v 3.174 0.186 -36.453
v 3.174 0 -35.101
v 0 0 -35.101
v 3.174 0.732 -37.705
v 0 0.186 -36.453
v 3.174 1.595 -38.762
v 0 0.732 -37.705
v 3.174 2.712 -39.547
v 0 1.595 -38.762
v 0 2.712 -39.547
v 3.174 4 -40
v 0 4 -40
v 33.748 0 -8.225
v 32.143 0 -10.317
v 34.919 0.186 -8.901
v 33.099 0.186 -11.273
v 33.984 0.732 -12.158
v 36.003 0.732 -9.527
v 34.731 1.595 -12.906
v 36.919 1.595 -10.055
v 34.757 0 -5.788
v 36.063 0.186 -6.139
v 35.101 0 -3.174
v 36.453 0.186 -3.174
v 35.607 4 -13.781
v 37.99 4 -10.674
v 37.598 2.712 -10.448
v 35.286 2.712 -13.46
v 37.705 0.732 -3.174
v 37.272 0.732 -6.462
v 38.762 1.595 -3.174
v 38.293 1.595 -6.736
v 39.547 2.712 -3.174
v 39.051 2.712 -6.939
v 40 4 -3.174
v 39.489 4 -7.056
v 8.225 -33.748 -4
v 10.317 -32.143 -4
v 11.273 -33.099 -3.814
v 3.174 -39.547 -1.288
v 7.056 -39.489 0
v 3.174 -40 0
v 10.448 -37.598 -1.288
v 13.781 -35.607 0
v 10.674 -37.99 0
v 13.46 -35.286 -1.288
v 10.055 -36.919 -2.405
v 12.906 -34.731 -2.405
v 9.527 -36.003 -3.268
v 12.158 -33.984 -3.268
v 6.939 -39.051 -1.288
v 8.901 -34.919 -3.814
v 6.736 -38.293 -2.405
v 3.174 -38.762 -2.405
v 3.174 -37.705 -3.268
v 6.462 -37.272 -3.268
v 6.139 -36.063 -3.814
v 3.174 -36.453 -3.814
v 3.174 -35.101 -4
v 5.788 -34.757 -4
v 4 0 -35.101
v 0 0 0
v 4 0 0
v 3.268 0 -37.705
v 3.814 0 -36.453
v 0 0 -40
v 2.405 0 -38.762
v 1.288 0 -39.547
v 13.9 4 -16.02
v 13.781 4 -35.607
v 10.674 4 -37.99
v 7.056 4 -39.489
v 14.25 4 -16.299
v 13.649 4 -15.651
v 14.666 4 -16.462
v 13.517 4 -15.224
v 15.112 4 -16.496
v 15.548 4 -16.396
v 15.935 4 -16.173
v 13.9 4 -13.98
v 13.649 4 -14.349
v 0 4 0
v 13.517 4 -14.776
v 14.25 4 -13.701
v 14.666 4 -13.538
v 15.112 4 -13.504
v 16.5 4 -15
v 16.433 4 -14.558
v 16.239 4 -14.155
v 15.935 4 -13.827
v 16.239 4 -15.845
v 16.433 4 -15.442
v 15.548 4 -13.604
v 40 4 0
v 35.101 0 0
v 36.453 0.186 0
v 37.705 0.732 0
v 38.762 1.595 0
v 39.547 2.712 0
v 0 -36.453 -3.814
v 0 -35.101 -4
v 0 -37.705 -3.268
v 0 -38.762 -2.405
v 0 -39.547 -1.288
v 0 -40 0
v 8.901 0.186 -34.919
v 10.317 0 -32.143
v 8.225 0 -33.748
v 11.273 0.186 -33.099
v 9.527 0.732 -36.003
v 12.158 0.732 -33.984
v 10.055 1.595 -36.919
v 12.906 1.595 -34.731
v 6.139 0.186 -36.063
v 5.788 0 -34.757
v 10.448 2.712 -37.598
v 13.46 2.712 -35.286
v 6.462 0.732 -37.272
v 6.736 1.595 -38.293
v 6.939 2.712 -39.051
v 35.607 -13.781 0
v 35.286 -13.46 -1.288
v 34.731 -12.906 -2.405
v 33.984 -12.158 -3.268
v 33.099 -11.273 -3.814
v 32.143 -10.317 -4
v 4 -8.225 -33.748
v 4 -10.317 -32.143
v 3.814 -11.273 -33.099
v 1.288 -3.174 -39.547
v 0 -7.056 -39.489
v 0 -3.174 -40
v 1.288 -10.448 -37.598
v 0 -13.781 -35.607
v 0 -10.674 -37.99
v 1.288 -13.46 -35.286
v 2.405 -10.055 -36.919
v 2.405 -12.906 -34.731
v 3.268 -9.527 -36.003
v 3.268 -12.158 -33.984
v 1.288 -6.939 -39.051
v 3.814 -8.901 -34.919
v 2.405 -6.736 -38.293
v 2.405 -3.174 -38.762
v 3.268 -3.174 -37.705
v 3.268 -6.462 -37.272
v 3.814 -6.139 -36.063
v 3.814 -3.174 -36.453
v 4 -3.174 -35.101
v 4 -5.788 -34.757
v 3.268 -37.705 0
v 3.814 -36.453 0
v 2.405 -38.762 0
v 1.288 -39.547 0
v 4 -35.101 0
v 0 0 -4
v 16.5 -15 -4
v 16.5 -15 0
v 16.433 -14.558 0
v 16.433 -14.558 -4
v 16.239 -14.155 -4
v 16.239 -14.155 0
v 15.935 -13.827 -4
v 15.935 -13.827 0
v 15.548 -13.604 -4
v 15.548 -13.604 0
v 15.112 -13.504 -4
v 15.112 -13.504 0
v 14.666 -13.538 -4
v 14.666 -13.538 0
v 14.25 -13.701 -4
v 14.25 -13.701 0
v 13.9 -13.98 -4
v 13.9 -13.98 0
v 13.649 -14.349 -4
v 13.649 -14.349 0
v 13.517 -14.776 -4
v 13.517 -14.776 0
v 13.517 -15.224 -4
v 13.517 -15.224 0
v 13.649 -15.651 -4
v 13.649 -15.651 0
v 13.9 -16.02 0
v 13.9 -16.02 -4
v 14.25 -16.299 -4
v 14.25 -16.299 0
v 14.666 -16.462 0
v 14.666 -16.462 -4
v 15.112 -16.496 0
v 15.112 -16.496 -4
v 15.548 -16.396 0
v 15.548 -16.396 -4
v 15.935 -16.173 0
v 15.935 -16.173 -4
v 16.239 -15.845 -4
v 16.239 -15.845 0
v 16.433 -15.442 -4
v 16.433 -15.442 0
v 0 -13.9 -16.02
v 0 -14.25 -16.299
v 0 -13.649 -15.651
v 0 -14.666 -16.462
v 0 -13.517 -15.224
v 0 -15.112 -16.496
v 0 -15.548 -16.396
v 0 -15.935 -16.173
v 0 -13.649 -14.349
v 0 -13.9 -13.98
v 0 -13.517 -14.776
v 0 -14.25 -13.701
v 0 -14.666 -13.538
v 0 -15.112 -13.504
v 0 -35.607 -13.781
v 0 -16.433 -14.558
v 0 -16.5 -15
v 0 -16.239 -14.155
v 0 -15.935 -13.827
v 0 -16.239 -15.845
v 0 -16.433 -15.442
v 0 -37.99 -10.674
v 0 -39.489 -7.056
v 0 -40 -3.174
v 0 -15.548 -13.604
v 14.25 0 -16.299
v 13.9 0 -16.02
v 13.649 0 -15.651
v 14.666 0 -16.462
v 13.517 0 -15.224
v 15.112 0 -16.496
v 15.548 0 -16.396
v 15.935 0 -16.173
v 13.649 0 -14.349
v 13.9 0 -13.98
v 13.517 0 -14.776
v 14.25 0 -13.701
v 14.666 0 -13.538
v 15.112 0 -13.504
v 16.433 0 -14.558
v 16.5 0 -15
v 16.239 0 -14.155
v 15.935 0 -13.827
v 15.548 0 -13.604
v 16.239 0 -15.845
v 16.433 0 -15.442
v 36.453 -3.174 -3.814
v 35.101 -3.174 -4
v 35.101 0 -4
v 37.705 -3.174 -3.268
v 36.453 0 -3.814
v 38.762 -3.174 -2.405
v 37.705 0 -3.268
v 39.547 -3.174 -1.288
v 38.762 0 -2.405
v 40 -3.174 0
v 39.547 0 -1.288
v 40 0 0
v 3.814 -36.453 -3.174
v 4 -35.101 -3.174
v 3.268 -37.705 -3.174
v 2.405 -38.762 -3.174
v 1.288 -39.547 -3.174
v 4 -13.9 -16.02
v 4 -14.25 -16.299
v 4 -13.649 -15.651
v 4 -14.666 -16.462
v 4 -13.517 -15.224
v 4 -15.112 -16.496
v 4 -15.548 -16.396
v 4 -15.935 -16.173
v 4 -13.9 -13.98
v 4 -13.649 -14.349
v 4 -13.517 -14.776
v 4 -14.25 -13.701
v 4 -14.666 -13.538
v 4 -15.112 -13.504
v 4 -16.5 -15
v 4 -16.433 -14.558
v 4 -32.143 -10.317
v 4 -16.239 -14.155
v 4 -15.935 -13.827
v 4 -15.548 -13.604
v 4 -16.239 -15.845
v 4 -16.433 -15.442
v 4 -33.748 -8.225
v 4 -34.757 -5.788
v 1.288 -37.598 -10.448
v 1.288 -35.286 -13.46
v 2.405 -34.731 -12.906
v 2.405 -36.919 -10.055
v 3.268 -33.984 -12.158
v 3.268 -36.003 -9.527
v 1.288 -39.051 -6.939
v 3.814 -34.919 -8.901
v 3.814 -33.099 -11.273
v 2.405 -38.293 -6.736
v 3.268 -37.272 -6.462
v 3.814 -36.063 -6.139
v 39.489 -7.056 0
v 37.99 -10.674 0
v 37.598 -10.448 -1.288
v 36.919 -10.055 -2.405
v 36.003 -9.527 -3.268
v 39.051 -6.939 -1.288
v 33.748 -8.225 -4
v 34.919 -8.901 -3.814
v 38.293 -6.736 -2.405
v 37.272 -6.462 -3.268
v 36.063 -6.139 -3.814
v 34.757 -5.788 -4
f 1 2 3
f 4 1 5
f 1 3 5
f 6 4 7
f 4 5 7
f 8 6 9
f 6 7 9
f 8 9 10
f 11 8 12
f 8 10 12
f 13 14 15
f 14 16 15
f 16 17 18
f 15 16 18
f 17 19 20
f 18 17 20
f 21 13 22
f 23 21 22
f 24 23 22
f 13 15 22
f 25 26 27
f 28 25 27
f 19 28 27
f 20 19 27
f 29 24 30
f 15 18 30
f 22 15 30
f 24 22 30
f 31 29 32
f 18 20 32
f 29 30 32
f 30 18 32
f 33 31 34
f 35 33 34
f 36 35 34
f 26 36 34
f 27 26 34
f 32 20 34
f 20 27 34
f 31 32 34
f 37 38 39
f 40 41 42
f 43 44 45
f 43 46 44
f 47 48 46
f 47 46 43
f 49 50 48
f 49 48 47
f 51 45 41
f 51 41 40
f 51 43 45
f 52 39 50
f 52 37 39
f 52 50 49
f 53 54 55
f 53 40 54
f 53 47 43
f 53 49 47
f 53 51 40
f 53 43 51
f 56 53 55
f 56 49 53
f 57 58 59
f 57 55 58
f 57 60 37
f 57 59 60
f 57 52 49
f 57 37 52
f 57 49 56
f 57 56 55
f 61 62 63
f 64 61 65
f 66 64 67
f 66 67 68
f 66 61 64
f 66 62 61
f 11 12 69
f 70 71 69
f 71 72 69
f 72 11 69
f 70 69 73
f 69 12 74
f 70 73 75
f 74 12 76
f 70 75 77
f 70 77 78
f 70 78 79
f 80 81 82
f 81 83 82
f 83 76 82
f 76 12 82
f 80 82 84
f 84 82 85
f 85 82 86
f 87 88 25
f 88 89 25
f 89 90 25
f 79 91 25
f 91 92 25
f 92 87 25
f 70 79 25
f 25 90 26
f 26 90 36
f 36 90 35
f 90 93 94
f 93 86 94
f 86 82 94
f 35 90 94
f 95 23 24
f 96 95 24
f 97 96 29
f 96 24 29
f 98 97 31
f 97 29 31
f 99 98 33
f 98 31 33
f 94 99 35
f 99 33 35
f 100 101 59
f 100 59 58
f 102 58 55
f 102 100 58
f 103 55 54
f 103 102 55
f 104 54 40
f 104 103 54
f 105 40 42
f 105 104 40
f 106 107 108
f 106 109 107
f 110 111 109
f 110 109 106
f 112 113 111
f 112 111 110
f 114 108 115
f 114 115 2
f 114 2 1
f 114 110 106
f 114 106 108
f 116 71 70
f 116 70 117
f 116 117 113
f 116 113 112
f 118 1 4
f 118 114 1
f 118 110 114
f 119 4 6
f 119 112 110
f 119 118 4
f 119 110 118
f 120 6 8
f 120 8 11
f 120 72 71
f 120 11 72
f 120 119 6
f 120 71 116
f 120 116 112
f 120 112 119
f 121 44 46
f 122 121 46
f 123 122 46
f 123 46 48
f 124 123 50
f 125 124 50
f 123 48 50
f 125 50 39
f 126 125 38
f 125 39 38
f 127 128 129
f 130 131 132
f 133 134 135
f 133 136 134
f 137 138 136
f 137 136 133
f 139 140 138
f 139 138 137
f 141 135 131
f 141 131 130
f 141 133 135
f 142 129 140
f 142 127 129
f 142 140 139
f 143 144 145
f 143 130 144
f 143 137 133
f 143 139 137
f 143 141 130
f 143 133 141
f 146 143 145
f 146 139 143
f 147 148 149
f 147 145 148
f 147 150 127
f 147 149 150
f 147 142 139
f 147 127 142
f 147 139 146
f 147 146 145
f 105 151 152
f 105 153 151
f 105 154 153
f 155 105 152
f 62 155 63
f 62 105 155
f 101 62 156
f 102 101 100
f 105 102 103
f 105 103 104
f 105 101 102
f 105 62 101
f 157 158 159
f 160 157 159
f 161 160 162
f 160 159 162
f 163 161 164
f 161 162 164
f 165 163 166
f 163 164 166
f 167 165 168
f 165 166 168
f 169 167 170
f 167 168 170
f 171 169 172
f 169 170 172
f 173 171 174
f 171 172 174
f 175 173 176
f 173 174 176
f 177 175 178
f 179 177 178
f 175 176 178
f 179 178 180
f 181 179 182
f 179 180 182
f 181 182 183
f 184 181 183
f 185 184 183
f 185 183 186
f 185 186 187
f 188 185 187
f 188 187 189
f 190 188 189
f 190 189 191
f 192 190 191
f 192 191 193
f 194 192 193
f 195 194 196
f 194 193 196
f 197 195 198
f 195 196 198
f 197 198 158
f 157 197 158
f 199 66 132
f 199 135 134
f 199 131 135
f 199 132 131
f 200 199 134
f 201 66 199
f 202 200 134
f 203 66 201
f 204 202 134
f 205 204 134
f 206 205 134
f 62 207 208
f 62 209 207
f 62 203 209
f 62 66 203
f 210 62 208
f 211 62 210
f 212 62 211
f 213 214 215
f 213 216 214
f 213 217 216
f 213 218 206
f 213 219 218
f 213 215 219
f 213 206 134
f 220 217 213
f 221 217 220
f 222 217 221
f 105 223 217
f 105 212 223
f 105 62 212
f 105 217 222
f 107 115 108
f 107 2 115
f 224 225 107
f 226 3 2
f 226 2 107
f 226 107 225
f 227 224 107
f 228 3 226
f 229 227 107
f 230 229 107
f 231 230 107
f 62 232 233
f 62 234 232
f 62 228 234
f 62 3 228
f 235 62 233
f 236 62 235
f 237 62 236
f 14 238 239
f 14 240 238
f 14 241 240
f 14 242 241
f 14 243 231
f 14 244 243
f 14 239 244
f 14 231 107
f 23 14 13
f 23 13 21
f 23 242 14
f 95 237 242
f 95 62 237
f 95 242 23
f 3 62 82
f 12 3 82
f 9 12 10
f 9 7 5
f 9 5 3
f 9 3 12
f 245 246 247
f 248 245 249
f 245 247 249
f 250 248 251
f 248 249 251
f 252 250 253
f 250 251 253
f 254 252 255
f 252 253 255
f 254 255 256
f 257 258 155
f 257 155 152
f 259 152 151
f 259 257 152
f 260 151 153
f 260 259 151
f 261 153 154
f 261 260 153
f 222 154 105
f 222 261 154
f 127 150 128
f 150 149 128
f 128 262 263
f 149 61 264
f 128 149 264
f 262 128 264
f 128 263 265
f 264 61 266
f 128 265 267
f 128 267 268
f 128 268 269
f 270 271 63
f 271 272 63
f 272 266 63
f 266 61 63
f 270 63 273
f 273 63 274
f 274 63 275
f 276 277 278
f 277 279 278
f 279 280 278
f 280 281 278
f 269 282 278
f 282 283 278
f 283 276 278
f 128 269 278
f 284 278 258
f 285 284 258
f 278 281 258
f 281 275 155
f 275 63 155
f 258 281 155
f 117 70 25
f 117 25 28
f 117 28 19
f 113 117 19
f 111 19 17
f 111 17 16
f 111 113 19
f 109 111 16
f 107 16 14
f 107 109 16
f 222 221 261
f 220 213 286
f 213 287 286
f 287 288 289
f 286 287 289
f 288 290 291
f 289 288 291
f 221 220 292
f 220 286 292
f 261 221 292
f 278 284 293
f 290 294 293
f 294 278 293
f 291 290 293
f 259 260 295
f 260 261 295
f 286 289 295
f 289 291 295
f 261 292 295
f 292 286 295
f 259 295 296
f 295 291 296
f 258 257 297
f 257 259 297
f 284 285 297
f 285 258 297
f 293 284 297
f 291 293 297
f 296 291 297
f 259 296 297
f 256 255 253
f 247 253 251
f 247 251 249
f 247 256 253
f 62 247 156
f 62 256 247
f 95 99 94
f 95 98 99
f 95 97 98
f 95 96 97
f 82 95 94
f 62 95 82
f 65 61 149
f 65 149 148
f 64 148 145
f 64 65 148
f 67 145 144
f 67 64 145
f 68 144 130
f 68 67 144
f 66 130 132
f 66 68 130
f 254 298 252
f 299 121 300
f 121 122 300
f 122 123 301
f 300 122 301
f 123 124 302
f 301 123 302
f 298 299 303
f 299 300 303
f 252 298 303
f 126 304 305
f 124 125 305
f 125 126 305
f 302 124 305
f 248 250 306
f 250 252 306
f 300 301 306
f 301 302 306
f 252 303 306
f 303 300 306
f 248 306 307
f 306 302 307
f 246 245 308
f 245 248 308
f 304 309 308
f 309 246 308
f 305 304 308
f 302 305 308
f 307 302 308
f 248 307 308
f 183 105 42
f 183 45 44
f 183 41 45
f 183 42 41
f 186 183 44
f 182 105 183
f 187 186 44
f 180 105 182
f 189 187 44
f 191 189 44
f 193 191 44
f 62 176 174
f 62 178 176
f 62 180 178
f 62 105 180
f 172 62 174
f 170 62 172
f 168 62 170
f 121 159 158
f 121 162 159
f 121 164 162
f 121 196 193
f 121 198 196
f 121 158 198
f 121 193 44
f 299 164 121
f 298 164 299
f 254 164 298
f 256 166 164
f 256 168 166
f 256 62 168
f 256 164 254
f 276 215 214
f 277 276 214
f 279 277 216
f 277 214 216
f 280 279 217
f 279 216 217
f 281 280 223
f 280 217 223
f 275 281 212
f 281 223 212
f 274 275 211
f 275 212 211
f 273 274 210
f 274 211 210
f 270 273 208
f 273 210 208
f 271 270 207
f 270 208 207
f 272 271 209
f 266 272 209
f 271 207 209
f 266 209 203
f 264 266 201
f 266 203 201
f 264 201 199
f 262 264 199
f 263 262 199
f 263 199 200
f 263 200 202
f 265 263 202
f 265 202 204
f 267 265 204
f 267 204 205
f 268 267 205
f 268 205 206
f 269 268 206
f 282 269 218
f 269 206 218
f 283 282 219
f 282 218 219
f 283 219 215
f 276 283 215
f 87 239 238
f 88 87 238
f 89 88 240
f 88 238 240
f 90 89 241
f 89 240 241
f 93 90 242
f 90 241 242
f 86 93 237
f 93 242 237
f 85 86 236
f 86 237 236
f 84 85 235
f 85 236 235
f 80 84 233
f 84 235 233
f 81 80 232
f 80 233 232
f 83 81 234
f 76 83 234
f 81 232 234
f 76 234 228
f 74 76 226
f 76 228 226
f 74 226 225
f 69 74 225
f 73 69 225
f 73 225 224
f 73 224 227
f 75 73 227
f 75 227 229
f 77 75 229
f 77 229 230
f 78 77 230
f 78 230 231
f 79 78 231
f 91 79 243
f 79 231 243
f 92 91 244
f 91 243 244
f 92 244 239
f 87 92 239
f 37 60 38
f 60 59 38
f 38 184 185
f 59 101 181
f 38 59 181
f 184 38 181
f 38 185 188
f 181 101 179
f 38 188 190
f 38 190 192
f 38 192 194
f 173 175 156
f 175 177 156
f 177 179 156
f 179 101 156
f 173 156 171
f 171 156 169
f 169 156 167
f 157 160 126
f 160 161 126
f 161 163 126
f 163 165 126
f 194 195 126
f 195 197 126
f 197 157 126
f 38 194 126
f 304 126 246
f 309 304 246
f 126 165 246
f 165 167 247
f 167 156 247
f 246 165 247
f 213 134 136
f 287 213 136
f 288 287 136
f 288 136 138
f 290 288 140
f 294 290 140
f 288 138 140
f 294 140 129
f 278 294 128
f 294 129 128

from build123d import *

# Parameters (mm, degrees)
F0_R           = 1.5
F1_DEPTH       = 4
F2_R           = 15
F3_ANGLE       = 90
F4_ANGLE       = 270
F5_T1_DEPTH    = 30.8664248821
F5_T3_DEPTH    = 15.4215903688
F5_T5_DEPTH    = 15.4215903688
F5_T8_ANGLE    = 45
F5_T10_ANGLE   = 45
F5_2_T1_DEPTH  = 30.8664248821
F5_2_T3_DEPTH  = 15.4215903688
F5_2_T5_DEPTH  = 15.4215903688
F5_2_T8_ANGLE  = 45
F5_2_T10_ANGLE = 45
F5_3_T1_DEPTH  = 30.8664248821
F5_3_T3_DEPTH  = 15.4215903688
F5_3_T5_DEPTH  = 15.4215903688
F5_3_T8_ANGLE  = 45
F5_3_T10_ANGLE = 45


# Not quite as in the source:
# - a fillet or chamfer that OpenCascade refuses, or shapes differently, is made with other operations: its cross-section is extruded or revolved along the edge and cut away or added


with BuildPart() as f1:
    # F0 (on Front) → F1 (new body)
    with BuildSketch(Plane.XZ):
        Polygon((40, 0), (0, 0), (0, -40), (9.3873450905, -40), (40, -9.3873450905), align=None)
        with Locations((15, -15)):
            Circle(F0_R, mode=Mode.SUBTRACT)
    extrude(amount=-F1_DEPTH)

    # F2
    f2_edges = [f1.edges().sort_by_distance(p)[0] for p in [
        (9.387345, 2, -40),
        (40, 2, -9.387345),
    ]]
    fillet(f2_edges, radius=F2_R)


with BuildPart() as f3_1:
    # F3: copy of F1
    add(f1.part.rotate(Axis((0, 0, -20), (0, 0, -1)), F3_ANGLE))

    # F5#2: fillet of radius 5 on 1 edges, made by hand

    # F5_2_s2 → F5_2_t1 (cut)
    with BuildSketch(Plane(origin=(0, 10.9129291725, -10.9129291725), x_dir=(1, 0, 0), z_dir=(0, -0.7071067812, 0.7071067812))):
        with BuildLine():
            ThreePointArc((0, -34.9221266183), (2.8729833462, -33.1854247929), (4, -30.0231471327))
            Line((4, -30.0231471327), (4, -34.9221266183))
            Line((4, -34.9221266183), (0, -34.9221266183))
        make_face()
    extrude(amount=F5_2_T1_DEPTH, mode=Mode.SUBTRACT)

    # F5_2_s4 → F5_2_t3 (cut)
    with BuildSketch(Plane.XY.offset(-3.1741416549)):
        with BuildLine():
            ThreePointArc((4, -35.1010205144), (2.8729833462, -38.2632981746), (0, -40))
            Line((0, -40), (4, -40))
            Line((4, -40), (4, -35.1010205144))
        make_face()
    extrude(amount=F5_2_T3_DEPTH, mode=Mode.SUBTRACT)

    # F5_2_s6 → F5_2_t5 (cut)
    with BuildSketch(Plane.XZ.offset(-12.2474487139)):
        with BuildLine():
            ThreePointArc((4, -35.1010205144), (2.8729833462, -38.2632981746), (0, -40))
            Line((0, -40), (4, -40))
            Line((4, -40), (4, -35.1010205144))
        make_face()
    extrude(amount=F5_2_T5_DEPTH, mode=Mode.SUBTRACT)

    # F5_2_s7 → F5_2_t8 (revolve, cut)
    with BuildSketch(Plane(origin=(0, 10.9129291725, -10.9129291725), x_dir=(1, 0, 0), z_dir=(0, -0.7071067812, 0.7071067812))):
        with BuildLine():
            ThreePointArc((0, -34.9221266183), (2.8729833462, -33.1854247929), (4, -30.0231471327))
            Line((4, -30.0231471327), (4, -34.9221266183))
            Line((4, -34.9221266183), (0, -34.9221266183))
        make_face()
    revolve(axis=Axis((4, -3.1741416549, -25), (1, 0, 0)), revolution_arc=F5_2_T8_ANGLE, mode=Mode.SUBTRACT)

    # F5_2_s9 → F5_2_t10 (revolve, cut)
    with BuildSketch(Plane(origin=(0, -10.9129291725, 10.9129291725), x_dir=(1, 0, 0), z_dir=(0, 0.7071067812, -0.7071067812))):
        with BuildLine():
            ThreePointArc((0, 34.9221266183), (2.8729833462, 33.1854247929), (4, 30.0231471327))
            Line((4, 30.0231471327), (4, 34.9221266183))
            Line((4, 34.9221266183), (0, 34.9221266183))
        make_face()
    revolve(axis=Axis((4, -25, -3.1741416549), (-1, 0, 0)), revolution_arc=F5_2_T10_ANGLE, mode=Mode.SUBTRACT)


with BuildPart() as f4_1:
    # F4: copy of F1
    add(f1.part.rotate(Axis((20, 0, 0), (1, 0, 0)), F4_ANGLE))

    # F5#3: fillet of radius 5 on 1 edges, made by hand

    # F5_3_s2 → F5_3_t1 (cut)
    with BuildSketch(Plane(origin=(-10.9129291725, -10.9129291725, 0), x_dir=(0, 0, 1), z_dir=(0.7071067812, 0.7071067812, 0))):
        with BuildLine():
            ThreePointArc((0, 34.9221266183), (-2.8729833462, 33.1854247929), (-4, 30.0231471327))
            Line((-4, 30.0231471327), (-4, 34.9221266183))
            Line((-4, 34.9221266183), (0, 34.9221266183))
        make_face()
    extrude(amount=F5_3_T1_DEPTH, mode=Mode.SUBTRACT)

    # F5_3_s4 → F5_3_t3 (cut)
    with BuildSketch(Plane.XZ.offset(-12.2474487139)):
        with BuildLine():
            ThreePointArc((35.1010205144, -4), (38.2632981746, -2.8729833462), (40, 0))
            Line((40, 0), (40, -4))
            Line((40, -4), (35.1010205144, -4))
        make_face()
    extrude(amount=F5_3_T3_DEPTH, mode=Mode.SUBTRACT)

    # F5_3_s6 → F5_3_t5 (cut)
    with BuildSketch(Plane.YZ.offset(-12.2474487139)):
        with BuildLine():
            ThreePointArc((-35.1010205144, -4), (-38.2632981746, -2.8729833462), (-40, 0))
            Line((-40, 0), (-40, -4))
            Line((-40, -4), (-35.1010205144, -4))
        make_face()
    extrude(amount=F5_3_T5_DEPTH, mode=Mode.SUBTRACT)

    # F5_3_s7 → F5_3_t8 (revolve, cut)
    with BuildSketch(Plane(origin=(-10.9129291725, -10.9129291725, 0), x_dir=(0, 0, 1), z_dir=(0.7071067812, 0.7071067812, 0))):
        with BuildLine():
            ThreePointArc((0, 34.9221266183), (-2.8729833462, 33.1854247929), (-4, 30.0231471327))
            Line((-4, 30.0231471327), (-4, 34.9221266183))
            Line((-4, 34.9221266183), (0, 34.9221266183))
        make_face()
    revolve(axis=Axis((3.1741416549, -25, -4), (0, 0, -1)), revolution_arc=F5_3_T8_ANGLE, mode=Mode.SUBTRACT)

    # F5_3_s9 → F5_3_t10 (revolve, cut)
    with BuildSketch(Plane(origin=(10.9129291725, 10.9129291725, 0), x_dir=(0, 0, 1), z_dir=(-0.7071067812, -0.7071067812, 0))):
        with BuildLine():
            ThreePointArc((0, -34.9221266183), (-2.8729833462, -33.1854247929), (-4, -30.0231471327))
            Line((-4, -30.0231471327), (-4, -34.9221266183))
            Line((-4, -34.9221266183), (0, -34.9221266183))
        make_face()
    revolve(axis=Axis((25, -3.1741416549, -4), (0, 0, 1)), revolution_arc=F5_3_T10_ANGLE, mode=Mode.SUBTRACT)


with BuildPart() as f1_1:
    add(f1.part)

    # F5: fillet of radius 5 on 1 edges, made by hand

    # F5_s2 → F5_t1 (cut)
    with BuildSketch(Plane(origin=(-10.9129291725, 0, -10.9129291725), x_dir=(0, 1, 0), z_dir=(0.7071067812, 0, 0.7071067812))):
        with BuildLine():
            ThreePointArc((4, -34.9221266183), (1.1270166538, -33.1854247929), (0, -30.0231471327))
            Line((0, -30.0231471327), (0, -34.9221266183))
            Line((0, -34.9221266183), (4, -34.9221266183))
        make_face()
    extrude(amount=F5_T1_DEPTH, mode=Mode.SUBTRACT)

    # F5_s4 → F5_t3 (cut)
    with BuildSketch(Plane.XY.offset(-3.1741416549)):
        with BuildLine():
            ThreePointArc((35.1010205144, 0), (38.2632981746, 1.1270166538), (40, 4))
            Line((40, 4), (40, 0))
            Line((40, 0), (35.1010205144, 0))
        make_face()
    extrude(amount=F5_T3_DEPTH, mode=Mode.SUBTRACT)

    # F5_s6 → F5_t5 (cut)
    with BuildSketch(Plane.YZ.offset(-12.2474487139)):
        with BuildLine():
            ThreePointArc((0, -35.1010205144), (1.1270166538, -38.2632981746), (4, -40))
            Line((4, -40), (0, -40))
            Line((0, -40), (0, -35.1010205144))
        make_face()
    extrude(amount=F5_T5_DEPTH, mode=Mode.SUBTRACT)

    # F5_s7 → F5_t8 (revolve, cut)
    with BuildSketch(Plane(origin=(-10.9129291725, 0, -10.9129291725), x_dir=(0, 1, 0), z_dir=(0.7071067812, 0, 0.7071067812))):
        with BuildLine():
            ThreePointArc((0, -30.0231471327), (1.1270166538, -33.1854247929), (4, -34.9221266183))
            Line((4, -34.9221266183), (0, -34.9221266183))
            Line((0, -34.9221266183), (0, -30.0231471327))
        make_face()
    revolve(axis=Axis((3.1741416549, 0, -25), (0, 1, 0)), revolution_arc=F5_T8_ANGLE, mode=Mode.SUBTRACT)

    # F5_s9 → F5_t10 (revolve, cut)
    with BuildSketch(Plane(origin=(10.9129291725, 0, 10.9129291725), x_dir=(0, 1, 0), z_dir=(-0.7071067812, 0, -0.7071067812))):
        with BuildLine():
            ThreePointArc((0, 30.0231471327), (1.1270166538, 33.1854247929), (4, 34.9221266183))
            Line((4, 34.9221266183), (0, 34.9221266183))
            Line((0, 34.9221266183), (0, 30.0231471327))
        make_face()
    revolve(axis=Axis((25, 0, -3.1741416549), (0, -1, 0)), revolution_arc=F5_T10_ANGLE, mode=Mode.SUBTRACT)


solid = Compound([f3_1.part, f4_1.part, f1_1.part])
